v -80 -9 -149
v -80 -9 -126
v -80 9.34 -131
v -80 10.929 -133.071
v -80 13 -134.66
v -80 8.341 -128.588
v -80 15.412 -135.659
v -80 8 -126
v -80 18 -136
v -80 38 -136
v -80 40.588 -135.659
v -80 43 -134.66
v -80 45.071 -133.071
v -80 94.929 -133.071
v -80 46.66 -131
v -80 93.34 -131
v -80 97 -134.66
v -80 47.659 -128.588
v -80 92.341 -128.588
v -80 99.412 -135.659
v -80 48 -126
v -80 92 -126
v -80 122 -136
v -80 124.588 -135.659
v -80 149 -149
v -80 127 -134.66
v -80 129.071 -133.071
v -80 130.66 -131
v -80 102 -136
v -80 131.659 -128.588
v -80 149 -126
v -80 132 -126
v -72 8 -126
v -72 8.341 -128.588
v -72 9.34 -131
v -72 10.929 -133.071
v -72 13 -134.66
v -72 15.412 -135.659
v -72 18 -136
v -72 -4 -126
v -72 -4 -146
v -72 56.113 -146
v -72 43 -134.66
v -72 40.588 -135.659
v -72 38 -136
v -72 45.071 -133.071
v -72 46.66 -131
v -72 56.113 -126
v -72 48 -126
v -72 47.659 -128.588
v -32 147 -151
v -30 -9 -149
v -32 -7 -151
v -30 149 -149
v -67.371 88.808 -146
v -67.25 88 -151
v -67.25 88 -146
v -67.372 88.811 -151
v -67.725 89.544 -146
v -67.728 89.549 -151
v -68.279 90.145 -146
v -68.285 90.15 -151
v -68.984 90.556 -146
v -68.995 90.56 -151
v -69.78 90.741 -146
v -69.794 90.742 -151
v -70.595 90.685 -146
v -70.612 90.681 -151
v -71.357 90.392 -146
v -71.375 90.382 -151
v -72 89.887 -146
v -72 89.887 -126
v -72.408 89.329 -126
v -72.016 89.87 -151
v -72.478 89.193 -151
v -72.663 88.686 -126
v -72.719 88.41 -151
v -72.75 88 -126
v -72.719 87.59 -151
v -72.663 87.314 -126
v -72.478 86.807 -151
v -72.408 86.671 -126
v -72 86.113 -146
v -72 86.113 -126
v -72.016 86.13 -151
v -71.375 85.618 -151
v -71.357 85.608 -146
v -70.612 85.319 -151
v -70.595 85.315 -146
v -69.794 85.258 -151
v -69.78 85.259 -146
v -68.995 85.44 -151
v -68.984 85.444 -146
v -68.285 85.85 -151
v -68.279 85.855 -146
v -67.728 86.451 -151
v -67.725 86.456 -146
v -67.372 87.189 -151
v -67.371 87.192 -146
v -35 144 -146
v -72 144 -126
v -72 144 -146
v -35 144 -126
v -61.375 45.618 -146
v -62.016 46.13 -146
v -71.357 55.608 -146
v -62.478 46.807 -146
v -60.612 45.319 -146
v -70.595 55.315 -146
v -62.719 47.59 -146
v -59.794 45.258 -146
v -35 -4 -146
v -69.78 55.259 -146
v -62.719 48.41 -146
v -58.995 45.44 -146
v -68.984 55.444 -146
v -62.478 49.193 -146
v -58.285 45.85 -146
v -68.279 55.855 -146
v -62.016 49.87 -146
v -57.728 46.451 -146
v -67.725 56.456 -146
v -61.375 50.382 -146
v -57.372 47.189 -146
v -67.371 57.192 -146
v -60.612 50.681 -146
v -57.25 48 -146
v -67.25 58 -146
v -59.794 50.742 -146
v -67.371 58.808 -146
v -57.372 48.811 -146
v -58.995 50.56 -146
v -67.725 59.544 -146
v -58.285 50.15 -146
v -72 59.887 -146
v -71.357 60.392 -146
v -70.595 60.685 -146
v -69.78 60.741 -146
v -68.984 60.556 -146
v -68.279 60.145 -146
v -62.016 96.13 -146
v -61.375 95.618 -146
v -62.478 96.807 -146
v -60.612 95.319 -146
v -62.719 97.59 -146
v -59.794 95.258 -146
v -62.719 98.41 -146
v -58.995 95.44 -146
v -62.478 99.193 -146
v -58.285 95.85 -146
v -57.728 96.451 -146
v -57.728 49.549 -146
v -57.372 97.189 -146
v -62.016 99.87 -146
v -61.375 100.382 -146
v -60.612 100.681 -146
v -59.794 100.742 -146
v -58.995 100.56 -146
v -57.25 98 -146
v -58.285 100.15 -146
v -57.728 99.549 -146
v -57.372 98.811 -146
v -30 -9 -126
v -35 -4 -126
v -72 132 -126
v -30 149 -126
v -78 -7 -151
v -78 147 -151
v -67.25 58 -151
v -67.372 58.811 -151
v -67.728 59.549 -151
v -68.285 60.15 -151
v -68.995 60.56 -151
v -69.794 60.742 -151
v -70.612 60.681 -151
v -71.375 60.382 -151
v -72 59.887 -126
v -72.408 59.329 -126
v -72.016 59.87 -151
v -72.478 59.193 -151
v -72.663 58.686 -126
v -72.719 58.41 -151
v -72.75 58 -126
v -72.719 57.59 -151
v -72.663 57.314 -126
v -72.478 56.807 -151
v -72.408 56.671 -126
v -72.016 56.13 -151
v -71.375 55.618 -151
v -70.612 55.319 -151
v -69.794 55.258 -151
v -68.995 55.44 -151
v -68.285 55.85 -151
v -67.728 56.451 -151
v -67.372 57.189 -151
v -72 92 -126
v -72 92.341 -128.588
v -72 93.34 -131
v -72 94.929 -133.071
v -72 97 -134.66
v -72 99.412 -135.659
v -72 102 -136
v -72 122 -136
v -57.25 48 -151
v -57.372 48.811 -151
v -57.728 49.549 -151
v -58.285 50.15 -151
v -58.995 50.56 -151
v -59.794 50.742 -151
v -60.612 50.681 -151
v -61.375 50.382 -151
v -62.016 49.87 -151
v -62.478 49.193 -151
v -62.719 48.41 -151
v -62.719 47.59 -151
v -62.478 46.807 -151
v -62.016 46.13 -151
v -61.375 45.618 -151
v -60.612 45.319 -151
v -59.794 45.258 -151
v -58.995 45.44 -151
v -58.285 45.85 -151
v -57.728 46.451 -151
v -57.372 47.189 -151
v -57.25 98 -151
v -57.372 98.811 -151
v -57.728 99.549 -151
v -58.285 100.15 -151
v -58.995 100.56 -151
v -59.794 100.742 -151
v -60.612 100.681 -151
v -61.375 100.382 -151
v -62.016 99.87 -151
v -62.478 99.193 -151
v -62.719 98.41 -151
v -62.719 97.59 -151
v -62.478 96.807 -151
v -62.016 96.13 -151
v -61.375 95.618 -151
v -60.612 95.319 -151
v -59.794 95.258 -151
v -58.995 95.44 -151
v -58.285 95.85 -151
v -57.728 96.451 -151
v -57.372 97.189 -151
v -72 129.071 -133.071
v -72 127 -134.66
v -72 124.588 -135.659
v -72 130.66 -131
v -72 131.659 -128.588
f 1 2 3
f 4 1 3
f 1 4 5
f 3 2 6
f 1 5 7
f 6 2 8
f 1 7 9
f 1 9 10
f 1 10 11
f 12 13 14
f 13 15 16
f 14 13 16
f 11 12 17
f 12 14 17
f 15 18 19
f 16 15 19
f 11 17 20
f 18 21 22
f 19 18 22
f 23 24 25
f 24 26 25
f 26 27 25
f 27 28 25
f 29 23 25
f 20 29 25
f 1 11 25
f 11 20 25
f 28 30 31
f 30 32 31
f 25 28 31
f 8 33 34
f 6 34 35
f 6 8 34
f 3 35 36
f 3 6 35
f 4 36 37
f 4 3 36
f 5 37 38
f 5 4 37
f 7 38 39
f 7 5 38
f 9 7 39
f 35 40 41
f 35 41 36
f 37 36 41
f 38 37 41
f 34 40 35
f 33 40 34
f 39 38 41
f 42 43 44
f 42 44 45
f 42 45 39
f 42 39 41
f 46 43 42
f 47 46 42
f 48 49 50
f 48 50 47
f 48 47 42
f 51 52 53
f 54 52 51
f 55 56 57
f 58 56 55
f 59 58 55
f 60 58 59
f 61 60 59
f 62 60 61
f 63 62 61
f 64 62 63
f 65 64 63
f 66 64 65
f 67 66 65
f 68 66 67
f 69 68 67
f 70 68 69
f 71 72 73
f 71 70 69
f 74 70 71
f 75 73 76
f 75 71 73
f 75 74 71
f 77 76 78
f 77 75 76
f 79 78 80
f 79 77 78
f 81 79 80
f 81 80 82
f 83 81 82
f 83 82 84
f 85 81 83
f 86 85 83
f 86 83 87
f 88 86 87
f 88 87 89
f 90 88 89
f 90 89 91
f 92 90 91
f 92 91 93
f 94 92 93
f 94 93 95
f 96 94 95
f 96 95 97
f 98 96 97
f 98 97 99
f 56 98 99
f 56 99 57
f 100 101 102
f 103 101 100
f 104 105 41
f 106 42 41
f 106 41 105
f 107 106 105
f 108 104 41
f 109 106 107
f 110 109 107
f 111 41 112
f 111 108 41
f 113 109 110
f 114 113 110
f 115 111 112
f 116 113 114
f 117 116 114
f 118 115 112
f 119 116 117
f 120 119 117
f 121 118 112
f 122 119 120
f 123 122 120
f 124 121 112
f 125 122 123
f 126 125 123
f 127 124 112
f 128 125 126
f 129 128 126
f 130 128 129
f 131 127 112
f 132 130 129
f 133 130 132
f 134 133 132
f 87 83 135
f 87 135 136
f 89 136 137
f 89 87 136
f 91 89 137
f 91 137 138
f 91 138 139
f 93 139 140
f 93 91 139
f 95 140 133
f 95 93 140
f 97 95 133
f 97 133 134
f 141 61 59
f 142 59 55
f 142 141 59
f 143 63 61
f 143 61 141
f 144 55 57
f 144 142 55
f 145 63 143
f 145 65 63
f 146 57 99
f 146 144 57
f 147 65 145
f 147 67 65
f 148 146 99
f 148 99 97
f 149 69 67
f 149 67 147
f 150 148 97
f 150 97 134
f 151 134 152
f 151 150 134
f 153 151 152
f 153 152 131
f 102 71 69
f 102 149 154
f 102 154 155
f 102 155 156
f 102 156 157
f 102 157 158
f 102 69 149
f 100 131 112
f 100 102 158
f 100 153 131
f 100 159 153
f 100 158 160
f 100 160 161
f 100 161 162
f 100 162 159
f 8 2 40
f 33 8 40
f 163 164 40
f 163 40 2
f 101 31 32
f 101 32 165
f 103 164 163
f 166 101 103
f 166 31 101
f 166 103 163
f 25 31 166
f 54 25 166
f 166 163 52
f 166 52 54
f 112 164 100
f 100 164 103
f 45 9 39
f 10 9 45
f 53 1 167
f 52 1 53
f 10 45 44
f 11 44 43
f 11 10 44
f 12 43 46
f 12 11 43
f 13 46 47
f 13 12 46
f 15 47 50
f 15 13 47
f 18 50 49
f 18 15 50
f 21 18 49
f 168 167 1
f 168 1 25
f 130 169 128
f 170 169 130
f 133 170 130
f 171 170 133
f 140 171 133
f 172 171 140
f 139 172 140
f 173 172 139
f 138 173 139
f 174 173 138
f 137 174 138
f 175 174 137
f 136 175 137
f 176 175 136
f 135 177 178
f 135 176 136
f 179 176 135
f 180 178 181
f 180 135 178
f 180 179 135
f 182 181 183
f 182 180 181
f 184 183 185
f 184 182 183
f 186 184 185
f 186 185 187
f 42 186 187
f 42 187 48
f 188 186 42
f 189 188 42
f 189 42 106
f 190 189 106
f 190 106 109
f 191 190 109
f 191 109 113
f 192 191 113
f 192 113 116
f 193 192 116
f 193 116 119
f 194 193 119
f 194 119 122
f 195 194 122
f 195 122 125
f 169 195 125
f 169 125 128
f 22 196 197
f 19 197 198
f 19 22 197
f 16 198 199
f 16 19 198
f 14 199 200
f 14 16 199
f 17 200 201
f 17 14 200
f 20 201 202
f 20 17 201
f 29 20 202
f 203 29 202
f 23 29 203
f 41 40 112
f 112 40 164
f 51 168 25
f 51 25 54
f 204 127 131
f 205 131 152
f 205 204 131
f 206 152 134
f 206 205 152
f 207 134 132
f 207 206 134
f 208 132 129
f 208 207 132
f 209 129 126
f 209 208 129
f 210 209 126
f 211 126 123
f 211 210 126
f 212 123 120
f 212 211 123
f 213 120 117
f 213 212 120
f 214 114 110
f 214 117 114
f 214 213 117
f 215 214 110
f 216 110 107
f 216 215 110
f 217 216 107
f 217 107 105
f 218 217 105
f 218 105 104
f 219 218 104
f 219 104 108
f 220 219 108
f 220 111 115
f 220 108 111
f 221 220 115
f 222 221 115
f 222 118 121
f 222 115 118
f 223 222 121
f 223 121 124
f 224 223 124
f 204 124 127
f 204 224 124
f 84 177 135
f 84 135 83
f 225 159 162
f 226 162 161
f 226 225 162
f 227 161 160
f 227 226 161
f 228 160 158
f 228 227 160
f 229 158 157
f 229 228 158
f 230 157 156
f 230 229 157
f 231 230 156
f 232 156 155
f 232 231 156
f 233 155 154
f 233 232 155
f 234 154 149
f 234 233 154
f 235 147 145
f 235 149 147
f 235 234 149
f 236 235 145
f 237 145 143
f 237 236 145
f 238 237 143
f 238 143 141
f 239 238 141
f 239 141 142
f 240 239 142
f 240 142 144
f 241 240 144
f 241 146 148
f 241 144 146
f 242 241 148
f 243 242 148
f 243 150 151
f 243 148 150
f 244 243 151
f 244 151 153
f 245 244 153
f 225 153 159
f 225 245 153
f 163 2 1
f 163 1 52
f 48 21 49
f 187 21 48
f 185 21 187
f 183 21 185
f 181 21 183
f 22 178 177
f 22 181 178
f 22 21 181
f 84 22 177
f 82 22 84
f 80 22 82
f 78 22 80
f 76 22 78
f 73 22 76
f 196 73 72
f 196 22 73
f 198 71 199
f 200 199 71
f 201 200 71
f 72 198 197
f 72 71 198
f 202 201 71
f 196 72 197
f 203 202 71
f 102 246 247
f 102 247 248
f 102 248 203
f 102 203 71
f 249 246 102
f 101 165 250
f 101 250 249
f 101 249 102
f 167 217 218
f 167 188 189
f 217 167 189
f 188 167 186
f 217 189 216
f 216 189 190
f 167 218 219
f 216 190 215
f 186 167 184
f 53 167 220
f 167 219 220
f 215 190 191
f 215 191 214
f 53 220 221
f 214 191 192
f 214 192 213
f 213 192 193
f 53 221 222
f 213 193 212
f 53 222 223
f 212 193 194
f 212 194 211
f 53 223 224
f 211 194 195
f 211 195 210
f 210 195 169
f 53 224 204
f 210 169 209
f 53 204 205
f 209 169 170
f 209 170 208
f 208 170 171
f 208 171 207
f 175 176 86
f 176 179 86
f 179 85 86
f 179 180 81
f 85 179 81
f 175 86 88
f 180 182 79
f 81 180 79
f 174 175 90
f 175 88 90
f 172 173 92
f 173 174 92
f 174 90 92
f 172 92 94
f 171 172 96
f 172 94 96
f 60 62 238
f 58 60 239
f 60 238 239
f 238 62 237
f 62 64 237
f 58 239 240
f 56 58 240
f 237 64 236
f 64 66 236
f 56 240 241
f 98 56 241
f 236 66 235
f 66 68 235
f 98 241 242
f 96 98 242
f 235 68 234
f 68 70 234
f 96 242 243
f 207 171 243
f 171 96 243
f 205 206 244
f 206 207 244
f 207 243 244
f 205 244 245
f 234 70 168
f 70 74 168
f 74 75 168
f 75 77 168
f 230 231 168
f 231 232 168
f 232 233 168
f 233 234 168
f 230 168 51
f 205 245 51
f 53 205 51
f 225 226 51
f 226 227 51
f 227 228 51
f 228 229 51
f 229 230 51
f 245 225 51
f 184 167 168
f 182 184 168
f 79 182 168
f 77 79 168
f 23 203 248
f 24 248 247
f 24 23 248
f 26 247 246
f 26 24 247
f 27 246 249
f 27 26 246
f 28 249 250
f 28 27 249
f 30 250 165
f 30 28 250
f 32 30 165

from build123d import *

# Parameters (mm, degrees)
SKETCH021_W     = 50
SKETCH021_H     = 158
PAD008_DEPTH    = 25
SKETCH022_W     = 37
SKETCH022_H     = 148
POCKET005_DEPTH = 20
POCKET006_DEPTH = 16
SKETCH024_R     = 2.75
HOLE008_DEPTH   = 25
HOLE008_TIPS_R  = 2.75
CHAMFER002_SIZE = 2


with BuildPart() as part:
    # Sketch021 → Pad008 (new body)
    with BuildSketch(Plane.XY):
        with Locations((25, 82)):
            Rectangle(SKETCH021_W, SKETCH021_H)
    extrude(amount=-PAD008_DEPTH)

    # Sketch022 → Pocket005 (cut)
    with BuildSketch(Plane.XY):
        with Locations((26.5, 82)):
            Rectangle(SKETCH022_W, SKETCH022_H)
    extrude(amount=-POCKET005_DEPTH, mode=Mode.SUBTRACT)

    # Sketch023 → Pocket006 (cut)
    with BuildSketch(Plane.YZ):
        with BuildLine():
            ThreePointArc((30.000006, 10), (20.000006, 0), (30.000006, -10))
            Line((30.000006, -10), (50, -10))
            ThreePointArc((50, -10), (60, 0), (50, 10))
            Line((30.000006, 10), (50, 10))
        make_face()
        with BuildLine():
            ThreePointArc((114.000009, 10), (104.000009, 0), (114.000009, -10))
            Line((114.000009, -10), (134, -10))
            ThreePointArc((134, -10), (144, 0), (134, 10))
            Line((114.000009, 10), (134, 10))
        make_face()
    extrude(amount=POCKET006_DEPTH, mode=Mode.SUBTRACT)

    # Sketch024 → Hole008 (cut)
    with BuildSketch(Plane.XY.offset(-25)):
        with Locations((10, 100)):
            Circle(SKETCH024_R)
        with Locations((20, 110)):
            Circle(SKETCH024_R)
        with Locations((10, 70)):
            Circle(SKETCH024_R)
        with Locations((20, 60)):
            Circle(SKETCH024_R)
    extrude(amount=HOLE008_DEPTH, mode=Mode.SUBTRACT)

    # Hole008 tips → Hole008 tip 1 section 0
    with BuildSketch(Plane.XY, mode=Mode.PRIVATE) as hole008_tip_1_s0:
        with Locations((10, 100)):
            Circle(HOLE008_TIPS_R)
    loft([hole008_tip_1_s0.sketch, Vertex(10, 100, 1.652367)], mode=Mode.SUBTRACT)

    # Hole008 tips → Hole008 tip 2 section 0
    with BuildSketch(Plane.XY, mode=Mode.PRIVATE) as hole008_tip_2_s0:
        with Locations((20, 110)):
            Circle(HOLE008_TIPS_R)
    loft([hole008_tip_2_s0.sketch, Vertex(20, 110, 1.652367)], mode=Mode.SUBTRACT)

    # Hole008 tips → Hole008 tip 3 section 0
    with BuildSketch(Plane.XY, mode=Mode.PRIVATE) as hole008_tip_3_s0:
        with Locations((10, 70)):
            Circle(HOLE008_TIPS_R)
    loft([hole008_tip_3_s0.sketch, Vertex(10, 70, 1.652367)], mode=Mode.SUBTRACT)

    # Hole008 tips → Hole008 tip 4 section 0
    with BuildSketch(Plane.XY, mode=Mode.PRIVATE) as hole008_tip_4_s0:
        with Locations((20, 60)):
            Circle(HOLE008_TIPS_R)
    loft([hole008_tip_4_s0.sketch, Vertex(20, 60, 1.652367)], mode=Mode.SUBTRACT)

    # Chamfer002
    chamfer002_edges = [part.edges().sort_by_distance(p)[0] for p in [
        (25, 3, -25),
        (0, 82, -25),
        (25, 161, -25),
        (50, 82, -25),
    ]]
    chamfer(chamfer002_edges, length=CHAMFER002_SIZE)


with BuildPart() as part_1:
    # Body006 placement: moved
    add(part.part.moved(Location((-80, -12, -126))))


solid = part_1.part
